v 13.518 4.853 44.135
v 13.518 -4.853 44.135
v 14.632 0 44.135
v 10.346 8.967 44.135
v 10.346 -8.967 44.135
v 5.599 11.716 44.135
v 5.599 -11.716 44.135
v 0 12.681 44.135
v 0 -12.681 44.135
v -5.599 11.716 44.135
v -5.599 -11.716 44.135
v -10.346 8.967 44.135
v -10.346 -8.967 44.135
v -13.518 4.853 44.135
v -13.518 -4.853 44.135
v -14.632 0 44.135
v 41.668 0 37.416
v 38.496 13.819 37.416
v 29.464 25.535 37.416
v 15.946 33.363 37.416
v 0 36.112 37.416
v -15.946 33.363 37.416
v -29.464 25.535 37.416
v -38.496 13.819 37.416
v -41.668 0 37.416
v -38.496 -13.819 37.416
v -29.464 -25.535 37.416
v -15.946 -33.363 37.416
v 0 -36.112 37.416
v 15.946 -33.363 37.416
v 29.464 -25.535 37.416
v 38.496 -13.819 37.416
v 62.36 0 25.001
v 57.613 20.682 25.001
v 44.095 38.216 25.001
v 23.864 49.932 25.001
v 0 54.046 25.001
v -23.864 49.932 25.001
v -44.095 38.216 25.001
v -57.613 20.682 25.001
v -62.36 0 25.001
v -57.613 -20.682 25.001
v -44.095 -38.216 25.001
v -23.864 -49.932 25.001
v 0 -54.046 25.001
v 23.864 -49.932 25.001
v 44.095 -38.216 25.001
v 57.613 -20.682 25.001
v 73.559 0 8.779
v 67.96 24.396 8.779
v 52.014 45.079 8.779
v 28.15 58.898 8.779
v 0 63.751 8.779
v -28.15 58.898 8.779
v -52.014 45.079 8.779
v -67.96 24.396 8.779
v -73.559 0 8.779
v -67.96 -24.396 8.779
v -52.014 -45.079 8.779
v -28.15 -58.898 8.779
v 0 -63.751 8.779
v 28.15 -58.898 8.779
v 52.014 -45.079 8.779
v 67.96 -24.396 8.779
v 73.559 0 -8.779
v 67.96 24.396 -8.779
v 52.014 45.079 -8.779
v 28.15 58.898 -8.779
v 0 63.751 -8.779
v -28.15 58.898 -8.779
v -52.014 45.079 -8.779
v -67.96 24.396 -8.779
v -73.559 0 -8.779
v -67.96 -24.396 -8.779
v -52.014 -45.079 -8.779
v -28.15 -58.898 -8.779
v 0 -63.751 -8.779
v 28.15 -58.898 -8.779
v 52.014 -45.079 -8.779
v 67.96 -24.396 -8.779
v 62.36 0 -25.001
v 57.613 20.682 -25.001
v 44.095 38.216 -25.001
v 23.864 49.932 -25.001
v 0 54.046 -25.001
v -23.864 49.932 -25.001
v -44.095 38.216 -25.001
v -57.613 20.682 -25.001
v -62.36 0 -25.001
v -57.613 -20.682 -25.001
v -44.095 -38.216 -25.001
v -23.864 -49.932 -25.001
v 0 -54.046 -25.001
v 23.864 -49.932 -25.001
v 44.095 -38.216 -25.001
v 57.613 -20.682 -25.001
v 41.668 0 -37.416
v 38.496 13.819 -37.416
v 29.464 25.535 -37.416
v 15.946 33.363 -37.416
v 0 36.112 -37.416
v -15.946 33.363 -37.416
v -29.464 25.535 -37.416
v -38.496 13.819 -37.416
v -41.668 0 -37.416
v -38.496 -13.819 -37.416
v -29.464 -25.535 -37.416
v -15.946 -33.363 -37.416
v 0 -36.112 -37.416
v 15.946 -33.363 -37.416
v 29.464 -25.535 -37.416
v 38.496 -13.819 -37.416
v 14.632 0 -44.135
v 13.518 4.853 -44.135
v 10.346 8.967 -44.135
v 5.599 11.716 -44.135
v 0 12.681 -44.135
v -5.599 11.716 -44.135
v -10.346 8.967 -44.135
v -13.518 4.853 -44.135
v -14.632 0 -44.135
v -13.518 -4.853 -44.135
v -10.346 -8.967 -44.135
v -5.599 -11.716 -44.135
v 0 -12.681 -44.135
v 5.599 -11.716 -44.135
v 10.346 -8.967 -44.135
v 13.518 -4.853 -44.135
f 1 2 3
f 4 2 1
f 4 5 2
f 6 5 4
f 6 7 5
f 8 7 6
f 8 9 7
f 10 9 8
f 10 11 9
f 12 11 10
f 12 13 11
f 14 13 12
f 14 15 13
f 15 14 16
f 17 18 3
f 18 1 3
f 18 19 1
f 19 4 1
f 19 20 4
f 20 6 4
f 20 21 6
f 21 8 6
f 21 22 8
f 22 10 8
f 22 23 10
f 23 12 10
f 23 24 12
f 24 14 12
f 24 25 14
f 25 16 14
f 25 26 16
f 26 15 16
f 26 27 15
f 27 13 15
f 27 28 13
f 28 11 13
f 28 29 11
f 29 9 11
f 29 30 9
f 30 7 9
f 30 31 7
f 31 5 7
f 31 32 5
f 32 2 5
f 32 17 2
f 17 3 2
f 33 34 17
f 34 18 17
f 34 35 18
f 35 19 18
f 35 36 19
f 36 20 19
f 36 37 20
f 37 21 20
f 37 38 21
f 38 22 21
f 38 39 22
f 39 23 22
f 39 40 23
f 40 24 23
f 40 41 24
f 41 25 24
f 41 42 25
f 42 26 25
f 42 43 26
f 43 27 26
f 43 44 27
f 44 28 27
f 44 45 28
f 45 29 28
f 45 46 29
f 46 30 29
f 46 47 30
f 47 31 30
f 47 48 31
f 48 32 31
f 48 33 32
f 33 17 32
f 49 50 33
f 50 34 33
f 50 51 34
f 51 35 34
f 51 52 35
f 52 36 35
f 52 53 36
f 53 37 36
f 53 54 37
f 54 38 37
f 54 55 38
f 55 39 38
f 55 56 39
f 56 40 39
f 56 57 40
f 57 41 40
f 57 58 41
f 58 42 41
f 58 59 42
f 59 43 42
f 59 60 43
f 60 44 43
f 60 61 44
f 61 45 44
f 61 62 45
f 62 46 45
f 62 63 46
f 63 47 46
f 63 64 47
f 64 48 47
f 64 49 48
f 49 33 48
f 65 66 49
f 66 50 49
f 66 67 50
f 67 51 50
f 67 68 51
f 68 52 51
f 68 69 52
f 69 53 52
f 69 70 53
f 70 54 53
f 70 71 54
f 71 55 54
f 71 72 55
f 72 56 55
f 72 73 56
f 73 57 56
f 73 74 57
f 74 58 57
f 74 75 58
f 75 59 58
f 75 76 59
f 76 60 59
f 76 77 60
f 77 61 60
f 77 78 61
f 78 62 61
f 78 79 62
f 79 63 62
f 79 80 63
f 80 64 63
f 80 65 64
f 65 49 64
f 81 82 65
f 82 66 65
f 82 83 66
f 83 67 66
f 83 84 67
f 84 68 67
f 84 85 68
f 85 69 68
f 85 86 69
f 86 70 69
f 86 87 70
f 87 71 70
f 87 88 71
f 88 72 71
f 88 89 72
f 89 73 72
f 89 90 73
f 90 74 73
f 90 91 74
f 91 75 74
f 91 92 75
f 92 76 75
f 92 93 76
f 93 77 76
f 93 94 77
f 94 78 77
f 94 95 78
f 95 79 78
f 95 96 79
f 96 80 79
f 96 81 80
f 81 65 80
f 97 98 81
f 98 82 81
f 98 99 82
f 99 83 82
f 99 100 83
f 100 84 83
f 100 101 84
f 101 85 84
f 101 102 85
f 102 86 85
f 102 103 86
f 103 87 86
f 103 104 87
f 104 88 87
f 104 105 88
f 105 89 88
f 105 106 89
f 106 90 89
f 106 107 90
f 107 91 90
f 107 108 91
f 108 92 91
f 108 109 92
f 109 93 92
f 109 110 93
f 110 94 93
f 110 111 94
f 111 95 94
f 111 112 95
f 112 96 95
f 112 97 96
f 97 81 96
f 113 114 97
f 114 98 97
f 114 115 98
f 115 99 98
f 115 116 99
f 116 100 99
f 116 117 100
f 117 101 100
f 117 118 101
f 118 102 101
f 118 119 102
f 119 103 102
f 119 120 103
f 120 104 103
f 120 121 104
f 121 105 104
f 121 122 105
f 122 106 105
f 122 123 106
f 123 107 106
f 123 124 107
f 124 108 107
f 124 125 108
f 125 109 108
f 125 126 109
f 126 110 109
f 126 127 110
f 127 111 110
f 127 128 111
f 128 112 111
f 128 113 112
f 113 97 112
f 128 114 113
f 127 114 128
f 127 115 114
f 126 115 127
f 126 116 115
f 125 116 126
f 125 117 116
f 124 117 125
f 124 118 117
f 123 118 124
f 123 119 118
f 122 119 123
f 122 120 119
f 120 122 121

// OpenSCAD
// Generated by SolidPython 1.0.1 on 2020-07-29 00:46:52


scale(v = [15, 13, 9]) {
	sphere(r = 5);
}
/***********************************************
*********      SolidPython code:      **********
************************************************
 
# import packages: SolidPython
from solid import *
from solid.utils import *
from itertools import chain, combinations, permutations


class Resize:

    def __init__(self, scad_file):
        self.scad_file = scad_file
        #self.scad_file = import_scad(scad_file)
        # cone/cylinder param:
        self.r1 = 0
        self.r2 = 0
        self.h = 0
        # rectangular prism param:
        self.w = 0
        self.l = 0
        # ellipse param:
        self.r = 0

    # import OpenScad code (file name corresponds to shape)


    # classify shape + parameters
    def assign(self, param1, param2, param3):
        if self.scad_file == 'cone.scad':
            self.r1 = param1
            self.r2 = param2
            self.h = param3
        elif self.scad_file == 'cylinder.scad':
            self.r1 = param1
            self.r2 = param2
            self.h = param3
        elif self.scad_file == 'rectangularPrism.scad':
            self.h = param1
            self.l = param2
            self.w = param3
        else:
            self.r = param1
            self.h = param2

    # resize parameters
    def iterate(self):
        x = range(3, 20, 2)
        i = 1
        if self.scad_file == 'cone.scad':
            tempList = list(permutations(x, 2))
            for temp in tempList:
                param1 = temp[0]
                param2 = temp[1]
                filepath = 'produced_scad_files/' + 'cone' + str(param1) + '_' + str(param2) + '_' + '.scad'
                scad_render_to_file(cylinder(h=param1, r1=param2, r2=0), filepath)

        elif self.scad_file == 'cylinder.scad':
            tempList = list(permutations(x, 3))
            for temp in tempList:
                param1 = temp[0]
                param2 = temp[1]
                filepath = 'produced_scad_files/' + 'cylinder' + str(param1) + '_' + str(param2) + '_' + '.scad'
                scad_render_to_file(cylinder(h=param1, r1=param2, r2=param2), filepath)

        elif self.scad_file == 'rectangularPrism.scad':
            tempList = list(permutations(x, 3))
            for temp in tempList:
                param1 = temp[0]
                param2 = temp[1]
                param3 = temp[2]
                filepath = 'produced_scad_files/' + 'rectangularPrism' + str(param1) + '_' + str(param2) + '_' + str(
                    param3) + '.scad'
                scad_render_to_file(cube(size=(param1, param2, param3)), filepath)

        elif self.scad_file == 'ellipse.scad':
            tempList = list(permutations(x, 4))
            for temp in tempList:
                param1 = temp[0]
                param2 = temp[1]
                param3 = temp[2]
                param4 = temp[3]
                filepath = 'produced_scad_files/' + 'ellipse' + str(param1) + '_' + str(param2) + '_' + str(param3) + '_' + str(param4) + '.scad'
                scad_render_to_file(scale([param1, param2, param3])(sphere(r=param4)), filepath)

    def render_to_scadfile(self):
        scad_render_to_file(scad, 'example.scad') 
 
************************************************/
